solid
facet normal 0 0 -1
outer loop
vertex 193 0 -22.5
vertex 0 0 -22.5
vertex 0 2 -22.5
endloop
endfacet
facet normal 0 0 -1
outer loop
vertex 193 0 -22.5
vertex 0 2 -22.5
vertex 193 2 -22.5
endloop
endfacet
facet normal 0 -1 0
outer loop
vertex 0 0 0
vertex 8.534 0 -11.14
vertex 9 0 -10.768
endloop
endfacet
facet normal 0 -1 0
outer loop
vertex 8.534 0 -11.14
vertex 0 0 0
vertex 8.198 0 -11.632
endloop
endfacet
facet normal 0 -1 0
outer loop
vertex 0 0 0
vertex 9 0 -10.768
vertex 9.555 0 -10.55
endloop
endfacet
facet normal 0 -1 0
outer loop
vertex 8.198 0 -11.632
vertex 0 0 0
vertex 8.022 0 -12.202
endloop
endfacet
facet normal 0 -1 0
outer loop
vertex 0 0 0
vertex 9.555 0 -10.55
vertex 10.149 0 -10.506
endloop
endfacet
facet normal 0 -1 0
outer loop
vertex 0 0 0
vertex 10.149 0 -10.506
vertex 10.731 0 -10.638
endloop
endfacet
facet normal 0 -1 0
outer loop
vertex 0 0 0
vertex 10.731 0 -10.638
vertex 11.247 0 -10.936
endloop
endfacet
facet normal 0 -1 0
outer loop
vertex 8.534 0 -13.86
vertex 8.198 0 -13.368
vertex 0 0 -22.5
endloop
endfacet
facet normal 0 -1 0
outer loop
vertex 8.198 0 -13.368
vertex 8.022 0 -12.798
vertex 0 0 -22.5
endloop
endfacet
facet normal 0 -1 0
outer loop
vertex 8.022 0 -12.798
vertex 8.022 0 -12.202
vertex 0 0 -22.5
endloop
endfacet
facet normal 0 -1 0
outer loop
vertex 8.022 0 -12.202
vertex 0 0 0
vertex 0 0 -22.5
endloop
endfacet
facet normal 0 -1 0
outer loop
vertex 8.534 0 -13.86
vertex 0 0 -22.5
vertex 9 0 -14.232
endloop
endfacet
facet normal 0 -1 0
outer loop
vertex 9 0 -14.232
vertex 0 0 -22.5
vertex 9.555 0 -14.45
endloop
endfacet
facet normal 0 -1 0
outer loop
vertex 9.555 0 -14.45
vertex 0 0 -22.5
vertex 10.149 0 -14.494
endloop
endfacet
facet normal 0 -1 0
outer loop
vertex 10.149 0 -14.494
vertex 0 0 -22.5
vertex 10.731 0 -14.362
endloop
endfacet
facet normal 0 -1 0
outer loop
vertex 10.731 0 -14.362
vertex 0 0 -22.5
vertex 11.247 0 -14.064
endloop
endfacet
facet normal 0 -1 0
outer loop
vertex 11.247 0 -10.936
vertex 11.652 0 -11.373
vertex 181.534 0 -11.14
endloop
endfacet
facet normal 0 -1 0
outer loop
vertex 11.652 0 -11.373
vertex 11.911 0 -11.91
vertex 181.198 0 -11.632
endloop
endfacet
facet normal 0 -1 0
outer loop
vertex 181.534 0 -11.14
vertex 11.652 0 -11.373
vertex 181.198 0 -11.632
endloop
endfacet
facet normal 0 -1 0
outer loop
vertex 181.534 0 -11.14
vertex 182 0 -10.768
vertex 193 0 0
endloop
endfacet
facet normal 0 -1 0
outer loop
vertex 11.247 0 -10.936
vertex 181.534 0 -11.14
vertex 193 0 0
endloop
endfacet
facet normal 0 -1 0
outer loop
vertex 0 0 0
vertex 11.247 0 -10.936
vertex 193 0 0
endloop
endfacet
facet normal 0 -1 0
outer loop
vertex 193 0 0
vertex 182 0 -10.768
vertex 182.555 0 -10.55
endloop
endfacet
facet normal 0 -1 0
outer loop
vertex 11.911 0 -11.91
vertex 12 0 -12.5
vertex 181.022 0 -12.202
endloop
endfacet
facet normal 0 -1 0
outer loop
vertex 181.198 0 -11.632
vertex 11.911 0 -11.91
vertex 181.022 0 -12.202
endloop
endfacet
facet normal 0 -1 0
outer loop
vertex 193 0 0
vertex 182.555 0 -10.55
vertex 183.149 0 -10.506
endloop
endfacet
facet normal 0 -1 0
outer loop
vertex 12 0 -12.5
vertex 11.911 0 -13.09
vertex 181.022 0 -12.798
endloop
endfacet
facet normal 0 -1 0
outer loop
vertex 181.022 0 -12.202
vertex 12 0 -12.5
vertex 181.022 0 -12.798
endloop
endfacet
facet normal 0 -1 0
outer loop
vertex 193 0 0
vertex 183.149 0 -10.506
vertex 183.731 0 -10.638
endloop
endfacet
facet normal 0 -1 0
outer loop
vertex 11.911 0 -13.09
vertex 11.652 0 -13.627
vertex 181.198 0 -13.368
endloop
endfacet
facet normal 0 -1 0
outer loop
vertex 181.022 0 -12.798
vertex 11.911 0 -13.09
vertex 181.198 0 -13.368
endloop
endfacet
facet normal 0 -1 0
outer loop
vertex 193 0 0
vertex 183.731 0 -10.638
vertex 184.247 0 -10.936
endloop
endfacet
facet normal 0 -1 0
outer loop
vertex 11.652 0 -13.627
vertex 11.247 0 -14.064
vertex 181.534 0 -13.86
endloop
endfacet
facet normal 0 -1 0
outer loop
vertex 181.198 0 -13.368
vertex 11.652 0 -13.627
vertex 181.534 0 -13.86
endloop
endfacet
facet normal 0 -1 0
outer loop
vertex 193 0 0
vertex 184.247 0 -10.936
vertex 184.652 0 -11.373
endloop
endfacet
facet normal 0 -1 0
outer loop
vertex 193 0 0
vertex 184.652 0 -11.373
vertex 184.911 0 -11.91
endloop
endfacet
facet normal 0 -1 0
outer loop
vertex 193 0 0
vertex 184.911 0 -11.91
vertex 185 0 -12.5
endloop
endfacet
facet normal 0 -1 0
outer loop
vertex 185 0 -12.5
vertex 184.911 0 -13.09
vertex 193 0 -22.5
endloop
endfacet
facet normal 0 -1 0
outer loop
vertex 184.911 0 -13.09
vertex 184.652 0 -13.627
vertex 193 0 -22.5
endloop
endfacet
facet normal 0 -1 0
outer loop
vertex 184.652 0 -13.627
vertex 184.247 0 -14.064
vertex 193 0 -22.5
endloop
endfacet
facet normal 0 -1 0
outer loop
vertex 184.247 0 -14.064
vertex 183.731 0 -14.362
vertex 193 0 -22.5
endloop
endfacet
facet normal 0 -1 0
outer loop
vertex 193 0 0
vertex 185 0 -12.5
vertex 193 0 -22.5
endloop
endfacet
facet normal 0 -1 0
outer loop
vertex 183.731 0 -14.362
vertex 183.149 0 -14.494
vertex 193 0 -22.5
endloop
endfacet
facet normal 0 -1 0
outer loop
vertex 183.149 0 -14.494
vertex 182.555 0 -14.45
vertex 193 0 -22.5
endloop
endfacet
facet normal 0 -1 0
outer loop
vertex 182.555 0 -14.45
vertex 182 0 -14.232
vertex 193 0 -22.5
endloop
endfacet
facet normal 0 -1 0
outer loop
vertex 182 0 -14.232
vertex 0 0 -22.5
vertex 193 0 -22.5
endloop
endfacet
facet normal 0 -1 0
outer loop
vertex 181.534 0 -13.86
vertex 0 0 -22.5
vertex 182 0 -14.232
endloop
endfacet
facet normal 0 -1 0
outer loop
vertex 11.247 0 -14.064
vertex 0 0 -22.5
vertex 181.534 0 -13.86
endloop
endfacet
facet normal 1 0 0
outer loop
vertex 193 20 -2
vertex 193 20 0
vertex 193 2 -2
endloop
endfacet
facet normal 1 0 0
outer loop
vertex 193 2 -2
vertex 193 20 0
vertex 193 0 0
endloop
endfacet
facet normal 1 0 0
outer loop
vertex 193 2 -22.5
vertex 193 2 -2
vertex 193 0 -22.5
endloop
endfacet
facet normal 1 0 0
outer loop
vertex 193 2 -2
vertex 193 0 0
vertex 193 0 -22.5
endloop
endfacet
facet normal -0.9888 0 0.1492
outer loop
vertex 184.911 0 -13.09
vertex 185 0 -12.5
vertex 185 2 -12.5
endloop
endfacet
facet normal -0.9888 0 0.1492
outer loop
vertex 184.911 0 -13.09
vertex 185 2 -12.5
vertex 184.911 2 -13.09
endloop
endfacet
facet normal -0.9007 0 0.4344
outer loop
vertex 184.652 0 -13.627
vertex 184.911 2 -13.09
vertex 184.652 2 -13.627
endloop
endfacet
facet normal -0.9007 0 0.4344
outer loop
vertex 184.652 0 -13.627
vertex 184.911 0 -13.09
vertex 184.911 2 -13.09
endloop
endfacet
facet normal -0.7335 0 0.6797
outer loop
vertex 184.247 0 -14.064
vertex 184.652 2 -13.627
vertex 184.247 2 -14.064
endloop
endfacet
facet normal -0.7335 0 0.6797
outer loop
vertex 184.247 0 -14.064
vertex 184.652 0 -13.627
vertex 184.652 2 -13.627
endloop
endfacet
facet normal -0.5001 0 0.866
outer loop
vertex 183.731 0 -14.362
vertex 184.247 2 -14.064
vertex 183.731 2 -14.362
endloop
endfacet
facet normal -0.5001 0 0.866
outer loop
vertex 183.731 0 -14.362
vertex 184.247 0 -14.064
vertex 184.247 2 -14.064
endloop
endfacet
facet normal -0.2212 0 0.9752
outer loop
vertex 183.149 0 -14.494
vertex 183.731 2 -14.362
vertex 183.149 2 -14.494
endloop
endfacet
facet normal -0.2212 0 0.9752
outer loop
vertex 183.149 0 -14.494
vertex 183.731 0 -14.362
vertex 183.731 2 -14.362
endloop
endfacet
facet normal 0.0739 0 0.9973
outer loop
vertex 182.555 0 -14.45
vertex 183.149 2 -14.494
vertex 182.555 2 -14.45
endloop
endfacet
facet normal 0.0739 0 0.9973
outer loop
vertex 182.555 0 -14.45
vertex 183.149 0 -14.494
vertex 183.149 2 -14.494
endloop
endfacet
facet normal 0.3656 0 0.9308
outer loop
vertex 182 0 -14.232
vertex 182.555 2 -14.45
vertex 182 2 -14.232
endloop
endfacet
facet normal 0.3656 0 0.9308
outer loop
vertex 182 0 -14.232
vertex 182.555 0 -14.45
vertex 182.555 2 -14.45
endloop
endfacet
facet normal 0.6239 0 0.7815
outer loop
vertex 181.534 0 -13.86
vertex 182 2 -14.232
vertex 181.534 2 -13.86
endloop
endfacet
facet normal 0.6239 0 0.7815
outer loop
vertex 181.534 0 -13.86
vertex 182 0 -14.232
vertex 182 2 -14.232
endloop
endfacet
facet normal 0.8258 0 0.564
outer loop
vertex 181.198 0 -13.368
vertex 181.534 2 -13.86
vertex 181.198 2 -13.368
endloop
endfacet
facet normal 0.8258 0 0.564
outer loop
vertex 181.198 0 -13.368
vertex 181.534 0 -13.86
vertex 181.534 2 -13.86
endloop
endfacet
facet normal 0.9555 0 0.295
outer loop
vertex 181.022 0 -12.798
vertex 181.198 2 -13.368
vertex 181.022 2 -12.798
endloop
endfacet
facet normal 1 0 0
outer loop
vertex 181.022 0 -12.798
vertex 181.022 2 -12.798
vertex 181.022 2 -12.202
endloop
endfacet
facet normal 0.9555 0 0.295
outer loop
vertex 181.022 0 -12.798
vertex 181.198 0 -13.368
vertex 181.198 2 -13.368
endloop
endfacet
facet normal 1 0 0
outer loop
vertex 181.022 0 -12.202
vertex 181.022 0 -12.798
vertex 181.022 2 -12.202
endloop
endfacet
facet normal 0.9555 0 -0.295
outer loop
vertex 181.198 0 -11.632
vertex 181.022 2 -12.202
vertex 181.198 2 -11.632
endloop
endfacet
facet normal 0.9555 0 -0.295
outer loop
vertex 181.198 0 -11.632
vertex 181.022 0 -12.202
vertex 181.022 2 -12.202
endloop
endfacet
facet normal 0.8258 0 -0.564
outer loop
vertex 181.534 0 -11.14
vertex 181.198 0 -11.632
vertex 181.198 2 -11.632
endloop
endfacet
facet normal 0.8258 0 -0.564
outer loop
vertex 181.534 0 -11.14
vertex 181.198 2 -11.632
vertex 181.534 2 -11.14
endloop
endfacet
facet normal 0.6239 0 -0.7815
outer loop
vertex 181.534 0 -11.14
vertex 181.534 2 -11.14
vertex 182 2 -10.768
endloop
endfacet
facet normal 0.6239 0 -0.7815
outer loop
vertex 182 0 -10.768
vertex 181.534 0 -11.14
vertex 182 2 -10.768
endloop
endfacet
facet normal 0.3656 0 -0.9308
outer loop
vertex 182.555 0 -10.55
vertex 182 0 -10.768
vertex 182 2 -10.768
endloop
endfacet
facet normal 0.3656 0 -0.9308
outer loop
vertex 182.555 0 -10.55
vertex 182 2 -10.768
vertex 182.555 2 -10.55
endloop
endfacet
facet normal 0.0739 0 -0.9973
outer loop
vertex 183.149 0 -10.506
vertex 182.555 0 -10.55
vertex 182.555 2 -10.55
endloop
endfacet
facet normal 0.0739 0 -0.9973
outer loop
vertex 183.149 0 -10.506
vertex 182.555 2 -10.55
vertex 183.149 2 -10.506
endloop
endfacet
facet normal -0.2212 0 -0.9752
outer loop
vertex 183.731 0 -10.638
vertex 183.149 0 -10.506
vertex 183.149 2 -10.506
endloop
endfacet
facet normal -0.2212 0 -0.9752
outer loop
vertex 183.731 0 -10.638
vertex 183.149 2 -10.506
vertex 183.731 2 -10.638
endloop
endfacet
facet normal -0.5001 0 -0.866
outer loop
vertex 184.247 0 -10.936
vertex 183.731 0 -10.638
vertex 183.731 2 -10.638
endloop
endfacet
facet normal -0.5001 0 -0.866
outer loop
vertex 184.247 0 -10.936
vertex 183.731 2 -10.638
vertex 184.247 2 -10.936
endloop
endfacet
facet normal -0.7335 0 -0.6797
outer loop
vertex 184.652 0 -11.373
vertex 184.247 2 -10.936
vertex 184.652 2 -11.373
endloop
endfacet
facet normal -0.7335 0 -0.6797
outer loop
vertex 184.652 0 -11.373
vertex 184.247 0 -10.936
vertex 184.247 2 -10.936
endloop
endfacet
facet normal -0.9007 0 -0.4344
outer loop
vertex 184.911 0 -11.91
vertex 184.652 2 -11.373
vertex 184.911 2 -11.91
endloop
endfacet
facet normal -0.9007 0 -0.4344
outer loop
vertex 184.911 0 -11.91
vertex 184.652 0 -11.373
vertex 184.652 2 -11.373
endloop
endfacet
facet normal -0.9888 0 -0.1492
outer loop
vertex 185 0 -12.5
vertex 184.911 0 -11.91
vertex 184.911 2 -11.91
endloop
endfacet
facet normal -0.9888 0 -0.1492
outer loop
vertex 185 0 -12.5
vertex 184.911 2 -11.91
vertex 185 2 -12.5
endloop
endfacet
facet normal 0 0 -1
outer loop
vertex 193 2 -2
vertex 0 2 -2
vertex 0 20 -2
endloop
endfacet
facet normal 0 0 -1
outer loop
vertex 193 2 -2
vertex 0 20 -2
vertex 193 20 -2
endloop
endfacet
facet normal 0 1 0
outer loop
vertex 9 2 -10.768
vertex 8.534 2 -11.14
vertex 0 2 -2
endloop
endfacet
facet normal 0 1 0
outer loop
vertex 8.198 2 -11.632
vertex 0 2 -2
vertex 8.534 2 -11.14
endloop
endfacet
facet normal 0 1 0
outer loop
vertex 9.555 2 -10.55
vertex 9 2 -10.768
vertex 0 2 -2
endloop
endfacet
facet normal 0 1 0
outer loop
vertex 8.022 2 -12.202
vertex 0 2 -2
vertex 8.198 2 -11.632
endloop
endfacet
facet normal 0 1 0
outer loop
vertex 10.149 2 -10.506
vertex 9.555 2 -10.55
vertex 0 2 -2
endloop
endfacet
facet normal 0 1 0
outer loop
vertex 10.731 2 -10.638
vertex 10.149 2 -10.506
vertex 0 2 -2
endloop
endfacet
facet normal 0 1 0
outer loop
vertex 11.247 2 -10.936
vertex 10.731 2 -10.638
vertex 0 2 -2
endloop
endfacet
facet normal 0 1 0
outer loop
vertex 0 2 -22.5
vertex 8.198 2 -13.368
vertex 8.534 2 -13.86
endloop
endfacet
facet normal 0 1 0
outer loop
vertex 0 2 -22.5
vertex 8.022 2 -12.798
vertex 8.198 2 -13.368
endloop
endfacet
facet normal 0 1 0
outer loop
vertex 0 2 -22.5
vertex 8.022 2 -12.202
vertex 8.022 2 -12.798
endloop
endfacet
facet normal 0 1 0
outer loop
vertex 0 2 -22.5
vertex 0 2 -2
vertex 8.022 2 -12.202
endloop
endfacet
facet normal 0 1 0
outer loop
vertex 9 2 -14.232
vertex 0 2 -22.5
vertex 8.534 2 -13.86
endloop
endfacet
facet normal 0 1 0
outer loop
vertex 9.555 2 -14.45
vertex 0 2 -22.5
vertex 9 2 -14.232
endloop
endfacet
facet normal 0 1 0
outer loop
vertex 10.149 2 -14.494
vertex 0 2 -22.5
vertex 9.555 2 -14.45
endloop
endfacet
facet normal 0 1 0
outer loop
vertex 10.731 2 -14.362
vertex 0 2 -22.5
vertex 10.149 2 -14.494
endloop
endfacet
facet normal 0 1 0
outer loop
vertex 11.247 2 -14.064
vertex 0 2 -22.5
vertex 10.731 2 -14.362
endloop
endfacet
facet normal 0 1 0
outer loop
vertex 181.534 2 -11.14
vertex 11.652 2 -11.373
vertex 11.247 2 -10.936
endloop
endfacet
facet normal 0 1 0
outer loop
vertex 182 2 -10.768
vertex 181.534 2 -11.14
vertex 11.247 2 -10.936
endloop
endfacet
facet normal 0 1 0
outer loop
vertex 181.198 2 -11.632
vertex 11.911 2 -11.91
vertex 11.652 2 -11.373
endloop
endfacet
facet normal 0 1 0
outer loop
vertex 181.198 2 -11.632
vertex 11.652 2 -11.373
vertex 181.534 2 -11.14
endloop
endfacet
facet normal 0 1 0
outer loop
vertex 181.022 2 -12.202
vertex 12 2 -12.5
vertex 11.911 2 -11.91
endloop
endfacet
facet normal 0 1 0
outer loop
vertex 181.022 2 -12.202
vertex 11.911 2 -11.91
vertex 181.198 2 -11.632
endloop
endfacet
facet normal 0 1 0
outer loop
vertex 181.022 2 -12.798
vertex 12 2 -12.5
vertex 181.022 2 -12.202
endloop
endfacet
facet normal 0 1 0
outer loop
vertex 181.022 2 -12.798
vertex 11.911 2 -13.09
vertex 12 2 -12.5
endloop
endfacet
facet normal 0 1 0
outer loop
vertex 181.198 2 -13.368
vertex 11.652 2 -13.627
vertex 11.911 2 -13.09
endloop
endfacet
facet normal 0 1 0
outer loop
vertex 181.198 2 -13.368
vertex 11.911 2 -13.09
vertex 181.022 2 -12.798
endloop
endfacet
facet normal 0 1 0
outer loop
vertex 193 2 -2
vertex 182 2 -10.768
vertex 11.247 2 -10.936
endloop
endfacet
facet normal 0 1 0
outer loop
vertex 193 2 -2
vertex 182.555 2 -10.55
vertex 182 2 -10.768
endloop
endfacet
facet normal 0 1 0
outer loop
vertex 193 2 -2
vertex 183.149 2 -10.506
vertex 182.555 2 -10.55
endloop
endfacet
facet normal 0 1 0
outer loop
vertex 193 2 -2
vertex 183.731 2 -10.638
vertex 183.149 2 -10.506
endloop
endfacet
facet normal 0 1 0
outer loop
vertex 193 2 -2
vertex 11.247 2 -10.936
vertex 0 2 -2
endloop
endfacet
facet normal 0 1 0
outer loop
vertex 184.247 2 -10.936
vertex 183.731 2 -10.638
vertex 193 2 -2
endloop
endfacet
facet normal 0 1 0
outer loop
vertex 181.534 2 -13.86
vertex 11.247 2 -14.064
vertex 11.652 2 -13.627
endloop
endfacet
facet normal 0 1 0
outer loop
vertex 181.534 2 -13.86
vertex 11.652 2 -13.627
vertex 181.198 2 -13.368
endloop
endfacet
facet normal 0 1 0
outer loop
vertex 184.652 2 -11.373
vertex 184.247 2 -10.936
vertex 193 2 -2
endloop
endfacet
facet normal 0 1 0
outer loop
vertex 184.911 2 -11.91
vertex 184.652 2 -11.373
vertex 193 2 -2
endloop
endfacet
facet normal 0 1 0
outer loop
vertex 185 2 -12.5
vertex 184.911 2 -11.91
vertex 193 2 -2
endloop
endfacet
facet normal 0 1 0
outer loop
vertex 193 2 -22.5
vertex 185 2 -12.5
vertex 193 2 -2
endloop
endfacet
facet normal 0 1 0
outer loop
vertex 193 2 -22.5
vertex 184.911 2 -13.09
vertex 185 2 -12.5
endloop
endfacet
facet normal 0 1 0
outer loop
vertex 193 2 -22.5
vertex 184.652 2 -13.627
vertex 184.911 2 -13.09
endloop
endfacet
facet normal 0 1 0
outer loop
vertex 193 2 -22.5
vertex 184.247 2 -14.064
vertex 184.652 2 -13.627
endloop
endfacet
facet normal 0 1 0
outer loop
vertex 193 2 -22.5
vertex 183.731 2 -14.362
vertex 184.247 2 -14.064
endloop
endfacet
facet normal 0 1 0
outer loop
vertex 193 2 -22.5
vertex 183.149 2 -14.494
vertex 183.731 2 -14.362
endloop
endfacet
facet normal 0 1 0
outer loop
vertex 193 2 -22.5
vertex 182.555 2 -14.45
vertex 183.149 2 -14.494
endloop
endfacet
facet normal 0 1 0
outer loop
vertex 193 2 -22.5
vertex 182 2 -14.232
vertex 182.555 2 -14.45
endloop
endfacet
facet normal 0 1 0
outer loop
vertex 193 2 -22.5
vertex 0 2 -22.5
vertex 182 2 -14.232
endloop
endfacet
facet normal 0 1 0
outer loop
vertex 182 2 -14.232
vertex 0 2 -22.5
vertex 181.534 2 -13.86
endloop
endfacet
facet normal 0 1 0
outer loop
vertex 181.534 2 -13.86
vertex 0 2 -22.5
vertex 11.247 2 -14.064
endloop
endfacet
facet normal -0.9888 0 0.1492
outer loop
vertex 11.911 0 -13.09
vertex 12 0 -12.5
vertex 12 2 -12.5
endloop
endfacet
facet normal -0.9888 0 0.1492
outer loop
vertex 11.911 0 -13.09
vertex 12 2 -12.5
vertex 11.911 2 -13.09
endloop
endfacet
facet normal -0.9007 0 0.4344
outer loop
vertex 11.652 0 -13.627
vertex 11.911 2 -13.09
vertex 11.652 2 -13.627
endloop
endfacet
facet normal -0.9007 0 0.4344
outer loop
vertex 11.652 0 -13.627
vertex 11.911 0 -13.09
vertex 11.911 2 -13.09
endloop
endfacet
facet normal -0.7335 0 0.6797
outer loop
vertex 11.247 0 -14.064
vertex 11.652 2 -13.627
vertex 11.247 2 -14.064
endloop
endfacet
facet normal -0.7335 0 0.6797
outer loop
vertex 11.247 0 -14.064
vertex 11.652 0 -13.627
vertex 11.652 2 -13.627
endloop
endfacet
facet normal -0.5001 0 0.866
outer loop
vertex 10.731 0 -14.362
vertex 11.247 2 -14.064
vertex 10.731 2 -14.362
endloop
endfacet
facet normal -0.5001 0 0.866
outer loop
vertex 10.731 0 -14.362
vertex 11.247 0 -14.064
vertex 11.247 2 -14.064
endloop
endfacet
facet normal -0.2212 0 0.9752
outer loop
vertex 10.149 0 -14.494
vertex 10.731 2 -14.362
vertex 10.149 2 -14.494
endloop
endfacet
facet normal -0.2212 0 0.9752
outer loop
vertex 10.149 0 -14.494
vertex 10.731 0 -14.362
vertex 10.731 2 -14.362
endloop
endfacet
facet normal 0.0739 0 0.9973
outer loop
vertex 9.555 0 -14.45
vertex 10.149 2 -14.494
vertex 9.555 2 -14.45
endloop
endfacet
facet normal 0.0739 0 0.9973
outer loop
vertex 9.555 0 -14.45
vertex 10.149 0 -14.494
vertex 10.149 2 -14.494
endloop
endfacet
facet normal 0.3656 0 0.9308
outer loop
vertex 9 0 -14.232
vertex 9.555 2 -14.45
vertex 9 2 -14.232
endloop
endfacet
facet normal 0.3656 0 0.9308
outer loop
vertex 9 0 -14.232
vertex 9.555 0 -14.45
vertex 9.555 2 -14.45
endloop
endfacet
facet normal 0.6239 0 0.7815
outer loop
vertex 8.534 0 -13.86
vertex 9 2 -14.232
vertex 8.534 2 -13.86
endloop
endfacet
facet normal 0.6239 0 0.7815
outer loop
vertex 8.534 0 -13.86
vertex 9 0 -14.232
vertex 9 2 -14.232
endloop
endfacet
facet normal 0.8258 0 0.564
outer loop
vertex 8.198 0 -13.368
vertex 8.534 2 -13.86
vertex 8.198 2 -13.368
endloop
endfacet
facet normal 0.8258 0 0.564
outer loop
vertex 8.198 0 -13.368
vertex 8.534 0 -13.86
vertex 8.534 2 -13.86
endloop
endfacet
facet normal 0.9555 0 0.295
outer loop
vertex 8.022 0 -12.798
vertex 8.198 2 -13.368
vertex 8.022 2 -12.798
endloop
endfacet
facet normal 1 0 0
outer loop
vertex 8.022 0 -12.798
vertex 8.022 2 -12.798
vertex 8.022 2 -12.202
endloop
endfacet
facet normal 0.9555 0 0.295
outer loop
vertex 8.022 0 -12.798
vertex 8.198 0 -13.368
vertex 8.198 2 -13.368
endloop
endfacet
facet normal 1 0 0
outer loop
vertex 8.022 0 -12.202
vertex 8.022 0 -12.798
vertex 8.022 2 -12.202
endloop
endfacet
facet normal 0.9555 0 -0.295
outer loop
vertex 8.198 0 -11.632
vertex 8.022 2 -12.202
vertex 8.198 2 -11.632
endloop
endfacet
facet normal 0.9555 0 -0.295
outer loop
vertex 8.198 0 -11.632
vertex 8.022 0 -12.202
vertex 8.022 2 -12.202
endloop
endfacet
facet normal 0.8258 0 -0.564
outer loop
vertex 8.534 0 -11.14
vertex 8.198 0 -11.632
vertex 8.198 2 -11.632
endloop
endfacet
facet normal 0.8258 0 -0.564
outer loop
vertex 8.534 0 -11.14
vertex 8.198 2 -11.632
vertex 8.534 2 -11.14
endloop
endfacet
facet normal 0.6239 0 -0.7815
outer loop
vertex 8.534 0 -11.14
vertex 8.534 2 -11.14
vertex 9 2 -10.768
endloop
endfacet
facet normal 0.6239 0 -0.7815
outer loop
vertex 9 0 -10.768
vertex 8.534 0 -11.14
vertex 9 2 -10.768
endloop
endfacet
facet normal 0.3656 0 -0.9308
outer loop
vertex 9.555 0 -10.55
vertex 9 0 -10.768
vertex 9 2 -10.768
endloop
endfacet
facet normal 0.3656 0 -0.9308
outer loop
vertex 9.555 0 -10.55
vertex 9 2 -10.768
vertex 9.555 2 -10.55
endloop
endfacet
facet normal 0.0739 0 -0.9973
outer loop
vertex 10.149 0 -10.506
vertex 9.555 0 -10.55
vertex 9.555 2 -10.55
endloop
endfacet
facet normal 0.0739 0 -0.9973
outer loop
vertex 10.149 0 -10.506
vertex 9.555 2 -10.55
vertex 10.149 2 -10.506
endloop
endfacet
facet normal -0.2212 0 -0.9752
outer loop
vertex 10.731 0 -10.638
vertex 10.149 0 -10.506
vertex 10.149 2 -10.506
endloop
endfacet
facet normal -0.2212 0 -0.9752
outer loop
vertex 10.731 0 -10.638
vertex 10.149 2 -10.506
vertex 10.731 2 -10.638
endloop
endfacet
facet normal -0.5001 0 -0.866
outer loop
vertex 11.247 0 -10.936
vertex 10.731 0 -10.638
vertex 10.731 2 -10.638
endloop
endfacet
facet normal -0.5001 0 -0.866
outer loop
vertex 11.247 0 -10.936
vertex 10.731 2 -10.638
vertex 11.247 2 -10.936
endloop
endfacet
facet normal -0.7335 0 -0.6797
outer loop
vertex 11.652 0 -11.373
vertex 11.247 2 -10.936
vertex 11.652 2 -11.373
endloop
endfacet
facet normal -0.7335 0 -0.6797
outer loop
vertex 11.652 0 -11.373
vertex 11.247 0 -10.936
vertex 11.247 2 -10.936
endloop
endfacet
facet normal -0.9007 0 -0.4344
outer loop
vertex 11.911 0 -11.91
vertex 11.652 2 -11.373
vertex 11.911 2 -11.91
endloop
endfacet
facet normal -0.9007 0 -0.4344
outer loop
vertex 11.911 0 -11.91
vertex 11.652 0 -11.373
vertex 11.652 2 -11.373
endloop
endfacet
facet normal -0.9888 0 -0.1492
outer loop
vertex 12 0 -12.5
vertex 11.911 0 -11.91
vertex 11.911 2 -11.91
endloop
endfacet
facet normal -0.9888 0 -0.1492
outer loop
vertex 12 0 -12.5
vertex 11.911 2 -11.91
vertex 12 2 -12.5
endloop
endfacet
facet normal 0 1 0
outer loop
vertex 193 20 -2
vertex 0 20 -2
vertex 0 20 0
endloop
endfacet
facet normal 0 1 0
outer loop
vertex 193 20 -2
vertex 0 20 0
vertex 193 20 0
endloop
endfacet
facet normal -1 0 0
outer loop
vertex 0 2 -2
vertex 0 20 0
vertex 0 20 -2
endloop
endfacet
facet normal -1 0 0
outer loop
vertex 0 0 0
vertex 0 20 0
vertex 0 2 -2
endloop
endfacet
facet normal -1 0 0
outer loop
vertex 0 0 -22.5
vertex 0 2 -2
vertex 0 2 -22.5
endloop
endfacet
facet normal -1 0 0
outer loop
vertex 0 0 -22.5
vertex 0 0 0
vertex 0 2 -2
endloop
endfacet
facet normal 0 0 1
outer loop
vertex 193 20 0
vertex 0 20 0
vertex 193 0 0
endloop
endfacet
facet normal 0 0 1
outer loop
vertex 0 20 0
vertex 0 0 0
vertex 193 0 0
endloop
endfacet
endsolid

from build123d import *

# Parameters (mm, degrees)
THICKEN1_OUTLINE_W   = 193
THICKEN1_OUTLINE_H   = 22.5
THICKEN1_OUTLINE_R   = 2
THICKEN1_DEPTH       = 2
THICKEN1_START       = 2
THICKEN1_2_OUTLINE_W = 193
THICKEN1_2_OUTLINE_H = 2
THICKEN1_2_DEPTH     = 18


# Read off the part's stored shape, not the designer's step: Thicken1
with BuildPart() as part:
    # Thicken1 outline → Thicken1 (new body)
    with BuildSketch(Plane(origin=(0, 0, 0), x_dir=(1, 0, 0), z_dir=(0, 1, 0))):
        with Locations((96.5, 11.25)):
            Rectangle(THICKEN1_OUTLINE_W, THICKEN1_OUTLINE_H)
        with Locations((10, 12.5)):
            Circle(THICKEN1_OUTLINE_R, mode=Mode.SUBTRACT)
        with Locations((183, 12.5)):
            Circle(THICKEN1_OUTLINE_R, mode=Mode.SUBTRACT)
    extrude(amount=THICKEN1_DEPTH)

    # Thicken1 2 outline → Thicken1 2 (add)
    with BuildSketch(Plane(origin=(0, 0, 0), x_dir=(1, 0, 0), z_dir=(0, 1, 0)).offset(THICKEN1_START)):
        with Locations((96.5, 1)):
            Rectangle(THICKEN1_2_OUTLINE_W, THICKEN1_2_OUTLINE_H)
    extrude(amount=THICKEN1_2_DEPTH)


solid = part.part
